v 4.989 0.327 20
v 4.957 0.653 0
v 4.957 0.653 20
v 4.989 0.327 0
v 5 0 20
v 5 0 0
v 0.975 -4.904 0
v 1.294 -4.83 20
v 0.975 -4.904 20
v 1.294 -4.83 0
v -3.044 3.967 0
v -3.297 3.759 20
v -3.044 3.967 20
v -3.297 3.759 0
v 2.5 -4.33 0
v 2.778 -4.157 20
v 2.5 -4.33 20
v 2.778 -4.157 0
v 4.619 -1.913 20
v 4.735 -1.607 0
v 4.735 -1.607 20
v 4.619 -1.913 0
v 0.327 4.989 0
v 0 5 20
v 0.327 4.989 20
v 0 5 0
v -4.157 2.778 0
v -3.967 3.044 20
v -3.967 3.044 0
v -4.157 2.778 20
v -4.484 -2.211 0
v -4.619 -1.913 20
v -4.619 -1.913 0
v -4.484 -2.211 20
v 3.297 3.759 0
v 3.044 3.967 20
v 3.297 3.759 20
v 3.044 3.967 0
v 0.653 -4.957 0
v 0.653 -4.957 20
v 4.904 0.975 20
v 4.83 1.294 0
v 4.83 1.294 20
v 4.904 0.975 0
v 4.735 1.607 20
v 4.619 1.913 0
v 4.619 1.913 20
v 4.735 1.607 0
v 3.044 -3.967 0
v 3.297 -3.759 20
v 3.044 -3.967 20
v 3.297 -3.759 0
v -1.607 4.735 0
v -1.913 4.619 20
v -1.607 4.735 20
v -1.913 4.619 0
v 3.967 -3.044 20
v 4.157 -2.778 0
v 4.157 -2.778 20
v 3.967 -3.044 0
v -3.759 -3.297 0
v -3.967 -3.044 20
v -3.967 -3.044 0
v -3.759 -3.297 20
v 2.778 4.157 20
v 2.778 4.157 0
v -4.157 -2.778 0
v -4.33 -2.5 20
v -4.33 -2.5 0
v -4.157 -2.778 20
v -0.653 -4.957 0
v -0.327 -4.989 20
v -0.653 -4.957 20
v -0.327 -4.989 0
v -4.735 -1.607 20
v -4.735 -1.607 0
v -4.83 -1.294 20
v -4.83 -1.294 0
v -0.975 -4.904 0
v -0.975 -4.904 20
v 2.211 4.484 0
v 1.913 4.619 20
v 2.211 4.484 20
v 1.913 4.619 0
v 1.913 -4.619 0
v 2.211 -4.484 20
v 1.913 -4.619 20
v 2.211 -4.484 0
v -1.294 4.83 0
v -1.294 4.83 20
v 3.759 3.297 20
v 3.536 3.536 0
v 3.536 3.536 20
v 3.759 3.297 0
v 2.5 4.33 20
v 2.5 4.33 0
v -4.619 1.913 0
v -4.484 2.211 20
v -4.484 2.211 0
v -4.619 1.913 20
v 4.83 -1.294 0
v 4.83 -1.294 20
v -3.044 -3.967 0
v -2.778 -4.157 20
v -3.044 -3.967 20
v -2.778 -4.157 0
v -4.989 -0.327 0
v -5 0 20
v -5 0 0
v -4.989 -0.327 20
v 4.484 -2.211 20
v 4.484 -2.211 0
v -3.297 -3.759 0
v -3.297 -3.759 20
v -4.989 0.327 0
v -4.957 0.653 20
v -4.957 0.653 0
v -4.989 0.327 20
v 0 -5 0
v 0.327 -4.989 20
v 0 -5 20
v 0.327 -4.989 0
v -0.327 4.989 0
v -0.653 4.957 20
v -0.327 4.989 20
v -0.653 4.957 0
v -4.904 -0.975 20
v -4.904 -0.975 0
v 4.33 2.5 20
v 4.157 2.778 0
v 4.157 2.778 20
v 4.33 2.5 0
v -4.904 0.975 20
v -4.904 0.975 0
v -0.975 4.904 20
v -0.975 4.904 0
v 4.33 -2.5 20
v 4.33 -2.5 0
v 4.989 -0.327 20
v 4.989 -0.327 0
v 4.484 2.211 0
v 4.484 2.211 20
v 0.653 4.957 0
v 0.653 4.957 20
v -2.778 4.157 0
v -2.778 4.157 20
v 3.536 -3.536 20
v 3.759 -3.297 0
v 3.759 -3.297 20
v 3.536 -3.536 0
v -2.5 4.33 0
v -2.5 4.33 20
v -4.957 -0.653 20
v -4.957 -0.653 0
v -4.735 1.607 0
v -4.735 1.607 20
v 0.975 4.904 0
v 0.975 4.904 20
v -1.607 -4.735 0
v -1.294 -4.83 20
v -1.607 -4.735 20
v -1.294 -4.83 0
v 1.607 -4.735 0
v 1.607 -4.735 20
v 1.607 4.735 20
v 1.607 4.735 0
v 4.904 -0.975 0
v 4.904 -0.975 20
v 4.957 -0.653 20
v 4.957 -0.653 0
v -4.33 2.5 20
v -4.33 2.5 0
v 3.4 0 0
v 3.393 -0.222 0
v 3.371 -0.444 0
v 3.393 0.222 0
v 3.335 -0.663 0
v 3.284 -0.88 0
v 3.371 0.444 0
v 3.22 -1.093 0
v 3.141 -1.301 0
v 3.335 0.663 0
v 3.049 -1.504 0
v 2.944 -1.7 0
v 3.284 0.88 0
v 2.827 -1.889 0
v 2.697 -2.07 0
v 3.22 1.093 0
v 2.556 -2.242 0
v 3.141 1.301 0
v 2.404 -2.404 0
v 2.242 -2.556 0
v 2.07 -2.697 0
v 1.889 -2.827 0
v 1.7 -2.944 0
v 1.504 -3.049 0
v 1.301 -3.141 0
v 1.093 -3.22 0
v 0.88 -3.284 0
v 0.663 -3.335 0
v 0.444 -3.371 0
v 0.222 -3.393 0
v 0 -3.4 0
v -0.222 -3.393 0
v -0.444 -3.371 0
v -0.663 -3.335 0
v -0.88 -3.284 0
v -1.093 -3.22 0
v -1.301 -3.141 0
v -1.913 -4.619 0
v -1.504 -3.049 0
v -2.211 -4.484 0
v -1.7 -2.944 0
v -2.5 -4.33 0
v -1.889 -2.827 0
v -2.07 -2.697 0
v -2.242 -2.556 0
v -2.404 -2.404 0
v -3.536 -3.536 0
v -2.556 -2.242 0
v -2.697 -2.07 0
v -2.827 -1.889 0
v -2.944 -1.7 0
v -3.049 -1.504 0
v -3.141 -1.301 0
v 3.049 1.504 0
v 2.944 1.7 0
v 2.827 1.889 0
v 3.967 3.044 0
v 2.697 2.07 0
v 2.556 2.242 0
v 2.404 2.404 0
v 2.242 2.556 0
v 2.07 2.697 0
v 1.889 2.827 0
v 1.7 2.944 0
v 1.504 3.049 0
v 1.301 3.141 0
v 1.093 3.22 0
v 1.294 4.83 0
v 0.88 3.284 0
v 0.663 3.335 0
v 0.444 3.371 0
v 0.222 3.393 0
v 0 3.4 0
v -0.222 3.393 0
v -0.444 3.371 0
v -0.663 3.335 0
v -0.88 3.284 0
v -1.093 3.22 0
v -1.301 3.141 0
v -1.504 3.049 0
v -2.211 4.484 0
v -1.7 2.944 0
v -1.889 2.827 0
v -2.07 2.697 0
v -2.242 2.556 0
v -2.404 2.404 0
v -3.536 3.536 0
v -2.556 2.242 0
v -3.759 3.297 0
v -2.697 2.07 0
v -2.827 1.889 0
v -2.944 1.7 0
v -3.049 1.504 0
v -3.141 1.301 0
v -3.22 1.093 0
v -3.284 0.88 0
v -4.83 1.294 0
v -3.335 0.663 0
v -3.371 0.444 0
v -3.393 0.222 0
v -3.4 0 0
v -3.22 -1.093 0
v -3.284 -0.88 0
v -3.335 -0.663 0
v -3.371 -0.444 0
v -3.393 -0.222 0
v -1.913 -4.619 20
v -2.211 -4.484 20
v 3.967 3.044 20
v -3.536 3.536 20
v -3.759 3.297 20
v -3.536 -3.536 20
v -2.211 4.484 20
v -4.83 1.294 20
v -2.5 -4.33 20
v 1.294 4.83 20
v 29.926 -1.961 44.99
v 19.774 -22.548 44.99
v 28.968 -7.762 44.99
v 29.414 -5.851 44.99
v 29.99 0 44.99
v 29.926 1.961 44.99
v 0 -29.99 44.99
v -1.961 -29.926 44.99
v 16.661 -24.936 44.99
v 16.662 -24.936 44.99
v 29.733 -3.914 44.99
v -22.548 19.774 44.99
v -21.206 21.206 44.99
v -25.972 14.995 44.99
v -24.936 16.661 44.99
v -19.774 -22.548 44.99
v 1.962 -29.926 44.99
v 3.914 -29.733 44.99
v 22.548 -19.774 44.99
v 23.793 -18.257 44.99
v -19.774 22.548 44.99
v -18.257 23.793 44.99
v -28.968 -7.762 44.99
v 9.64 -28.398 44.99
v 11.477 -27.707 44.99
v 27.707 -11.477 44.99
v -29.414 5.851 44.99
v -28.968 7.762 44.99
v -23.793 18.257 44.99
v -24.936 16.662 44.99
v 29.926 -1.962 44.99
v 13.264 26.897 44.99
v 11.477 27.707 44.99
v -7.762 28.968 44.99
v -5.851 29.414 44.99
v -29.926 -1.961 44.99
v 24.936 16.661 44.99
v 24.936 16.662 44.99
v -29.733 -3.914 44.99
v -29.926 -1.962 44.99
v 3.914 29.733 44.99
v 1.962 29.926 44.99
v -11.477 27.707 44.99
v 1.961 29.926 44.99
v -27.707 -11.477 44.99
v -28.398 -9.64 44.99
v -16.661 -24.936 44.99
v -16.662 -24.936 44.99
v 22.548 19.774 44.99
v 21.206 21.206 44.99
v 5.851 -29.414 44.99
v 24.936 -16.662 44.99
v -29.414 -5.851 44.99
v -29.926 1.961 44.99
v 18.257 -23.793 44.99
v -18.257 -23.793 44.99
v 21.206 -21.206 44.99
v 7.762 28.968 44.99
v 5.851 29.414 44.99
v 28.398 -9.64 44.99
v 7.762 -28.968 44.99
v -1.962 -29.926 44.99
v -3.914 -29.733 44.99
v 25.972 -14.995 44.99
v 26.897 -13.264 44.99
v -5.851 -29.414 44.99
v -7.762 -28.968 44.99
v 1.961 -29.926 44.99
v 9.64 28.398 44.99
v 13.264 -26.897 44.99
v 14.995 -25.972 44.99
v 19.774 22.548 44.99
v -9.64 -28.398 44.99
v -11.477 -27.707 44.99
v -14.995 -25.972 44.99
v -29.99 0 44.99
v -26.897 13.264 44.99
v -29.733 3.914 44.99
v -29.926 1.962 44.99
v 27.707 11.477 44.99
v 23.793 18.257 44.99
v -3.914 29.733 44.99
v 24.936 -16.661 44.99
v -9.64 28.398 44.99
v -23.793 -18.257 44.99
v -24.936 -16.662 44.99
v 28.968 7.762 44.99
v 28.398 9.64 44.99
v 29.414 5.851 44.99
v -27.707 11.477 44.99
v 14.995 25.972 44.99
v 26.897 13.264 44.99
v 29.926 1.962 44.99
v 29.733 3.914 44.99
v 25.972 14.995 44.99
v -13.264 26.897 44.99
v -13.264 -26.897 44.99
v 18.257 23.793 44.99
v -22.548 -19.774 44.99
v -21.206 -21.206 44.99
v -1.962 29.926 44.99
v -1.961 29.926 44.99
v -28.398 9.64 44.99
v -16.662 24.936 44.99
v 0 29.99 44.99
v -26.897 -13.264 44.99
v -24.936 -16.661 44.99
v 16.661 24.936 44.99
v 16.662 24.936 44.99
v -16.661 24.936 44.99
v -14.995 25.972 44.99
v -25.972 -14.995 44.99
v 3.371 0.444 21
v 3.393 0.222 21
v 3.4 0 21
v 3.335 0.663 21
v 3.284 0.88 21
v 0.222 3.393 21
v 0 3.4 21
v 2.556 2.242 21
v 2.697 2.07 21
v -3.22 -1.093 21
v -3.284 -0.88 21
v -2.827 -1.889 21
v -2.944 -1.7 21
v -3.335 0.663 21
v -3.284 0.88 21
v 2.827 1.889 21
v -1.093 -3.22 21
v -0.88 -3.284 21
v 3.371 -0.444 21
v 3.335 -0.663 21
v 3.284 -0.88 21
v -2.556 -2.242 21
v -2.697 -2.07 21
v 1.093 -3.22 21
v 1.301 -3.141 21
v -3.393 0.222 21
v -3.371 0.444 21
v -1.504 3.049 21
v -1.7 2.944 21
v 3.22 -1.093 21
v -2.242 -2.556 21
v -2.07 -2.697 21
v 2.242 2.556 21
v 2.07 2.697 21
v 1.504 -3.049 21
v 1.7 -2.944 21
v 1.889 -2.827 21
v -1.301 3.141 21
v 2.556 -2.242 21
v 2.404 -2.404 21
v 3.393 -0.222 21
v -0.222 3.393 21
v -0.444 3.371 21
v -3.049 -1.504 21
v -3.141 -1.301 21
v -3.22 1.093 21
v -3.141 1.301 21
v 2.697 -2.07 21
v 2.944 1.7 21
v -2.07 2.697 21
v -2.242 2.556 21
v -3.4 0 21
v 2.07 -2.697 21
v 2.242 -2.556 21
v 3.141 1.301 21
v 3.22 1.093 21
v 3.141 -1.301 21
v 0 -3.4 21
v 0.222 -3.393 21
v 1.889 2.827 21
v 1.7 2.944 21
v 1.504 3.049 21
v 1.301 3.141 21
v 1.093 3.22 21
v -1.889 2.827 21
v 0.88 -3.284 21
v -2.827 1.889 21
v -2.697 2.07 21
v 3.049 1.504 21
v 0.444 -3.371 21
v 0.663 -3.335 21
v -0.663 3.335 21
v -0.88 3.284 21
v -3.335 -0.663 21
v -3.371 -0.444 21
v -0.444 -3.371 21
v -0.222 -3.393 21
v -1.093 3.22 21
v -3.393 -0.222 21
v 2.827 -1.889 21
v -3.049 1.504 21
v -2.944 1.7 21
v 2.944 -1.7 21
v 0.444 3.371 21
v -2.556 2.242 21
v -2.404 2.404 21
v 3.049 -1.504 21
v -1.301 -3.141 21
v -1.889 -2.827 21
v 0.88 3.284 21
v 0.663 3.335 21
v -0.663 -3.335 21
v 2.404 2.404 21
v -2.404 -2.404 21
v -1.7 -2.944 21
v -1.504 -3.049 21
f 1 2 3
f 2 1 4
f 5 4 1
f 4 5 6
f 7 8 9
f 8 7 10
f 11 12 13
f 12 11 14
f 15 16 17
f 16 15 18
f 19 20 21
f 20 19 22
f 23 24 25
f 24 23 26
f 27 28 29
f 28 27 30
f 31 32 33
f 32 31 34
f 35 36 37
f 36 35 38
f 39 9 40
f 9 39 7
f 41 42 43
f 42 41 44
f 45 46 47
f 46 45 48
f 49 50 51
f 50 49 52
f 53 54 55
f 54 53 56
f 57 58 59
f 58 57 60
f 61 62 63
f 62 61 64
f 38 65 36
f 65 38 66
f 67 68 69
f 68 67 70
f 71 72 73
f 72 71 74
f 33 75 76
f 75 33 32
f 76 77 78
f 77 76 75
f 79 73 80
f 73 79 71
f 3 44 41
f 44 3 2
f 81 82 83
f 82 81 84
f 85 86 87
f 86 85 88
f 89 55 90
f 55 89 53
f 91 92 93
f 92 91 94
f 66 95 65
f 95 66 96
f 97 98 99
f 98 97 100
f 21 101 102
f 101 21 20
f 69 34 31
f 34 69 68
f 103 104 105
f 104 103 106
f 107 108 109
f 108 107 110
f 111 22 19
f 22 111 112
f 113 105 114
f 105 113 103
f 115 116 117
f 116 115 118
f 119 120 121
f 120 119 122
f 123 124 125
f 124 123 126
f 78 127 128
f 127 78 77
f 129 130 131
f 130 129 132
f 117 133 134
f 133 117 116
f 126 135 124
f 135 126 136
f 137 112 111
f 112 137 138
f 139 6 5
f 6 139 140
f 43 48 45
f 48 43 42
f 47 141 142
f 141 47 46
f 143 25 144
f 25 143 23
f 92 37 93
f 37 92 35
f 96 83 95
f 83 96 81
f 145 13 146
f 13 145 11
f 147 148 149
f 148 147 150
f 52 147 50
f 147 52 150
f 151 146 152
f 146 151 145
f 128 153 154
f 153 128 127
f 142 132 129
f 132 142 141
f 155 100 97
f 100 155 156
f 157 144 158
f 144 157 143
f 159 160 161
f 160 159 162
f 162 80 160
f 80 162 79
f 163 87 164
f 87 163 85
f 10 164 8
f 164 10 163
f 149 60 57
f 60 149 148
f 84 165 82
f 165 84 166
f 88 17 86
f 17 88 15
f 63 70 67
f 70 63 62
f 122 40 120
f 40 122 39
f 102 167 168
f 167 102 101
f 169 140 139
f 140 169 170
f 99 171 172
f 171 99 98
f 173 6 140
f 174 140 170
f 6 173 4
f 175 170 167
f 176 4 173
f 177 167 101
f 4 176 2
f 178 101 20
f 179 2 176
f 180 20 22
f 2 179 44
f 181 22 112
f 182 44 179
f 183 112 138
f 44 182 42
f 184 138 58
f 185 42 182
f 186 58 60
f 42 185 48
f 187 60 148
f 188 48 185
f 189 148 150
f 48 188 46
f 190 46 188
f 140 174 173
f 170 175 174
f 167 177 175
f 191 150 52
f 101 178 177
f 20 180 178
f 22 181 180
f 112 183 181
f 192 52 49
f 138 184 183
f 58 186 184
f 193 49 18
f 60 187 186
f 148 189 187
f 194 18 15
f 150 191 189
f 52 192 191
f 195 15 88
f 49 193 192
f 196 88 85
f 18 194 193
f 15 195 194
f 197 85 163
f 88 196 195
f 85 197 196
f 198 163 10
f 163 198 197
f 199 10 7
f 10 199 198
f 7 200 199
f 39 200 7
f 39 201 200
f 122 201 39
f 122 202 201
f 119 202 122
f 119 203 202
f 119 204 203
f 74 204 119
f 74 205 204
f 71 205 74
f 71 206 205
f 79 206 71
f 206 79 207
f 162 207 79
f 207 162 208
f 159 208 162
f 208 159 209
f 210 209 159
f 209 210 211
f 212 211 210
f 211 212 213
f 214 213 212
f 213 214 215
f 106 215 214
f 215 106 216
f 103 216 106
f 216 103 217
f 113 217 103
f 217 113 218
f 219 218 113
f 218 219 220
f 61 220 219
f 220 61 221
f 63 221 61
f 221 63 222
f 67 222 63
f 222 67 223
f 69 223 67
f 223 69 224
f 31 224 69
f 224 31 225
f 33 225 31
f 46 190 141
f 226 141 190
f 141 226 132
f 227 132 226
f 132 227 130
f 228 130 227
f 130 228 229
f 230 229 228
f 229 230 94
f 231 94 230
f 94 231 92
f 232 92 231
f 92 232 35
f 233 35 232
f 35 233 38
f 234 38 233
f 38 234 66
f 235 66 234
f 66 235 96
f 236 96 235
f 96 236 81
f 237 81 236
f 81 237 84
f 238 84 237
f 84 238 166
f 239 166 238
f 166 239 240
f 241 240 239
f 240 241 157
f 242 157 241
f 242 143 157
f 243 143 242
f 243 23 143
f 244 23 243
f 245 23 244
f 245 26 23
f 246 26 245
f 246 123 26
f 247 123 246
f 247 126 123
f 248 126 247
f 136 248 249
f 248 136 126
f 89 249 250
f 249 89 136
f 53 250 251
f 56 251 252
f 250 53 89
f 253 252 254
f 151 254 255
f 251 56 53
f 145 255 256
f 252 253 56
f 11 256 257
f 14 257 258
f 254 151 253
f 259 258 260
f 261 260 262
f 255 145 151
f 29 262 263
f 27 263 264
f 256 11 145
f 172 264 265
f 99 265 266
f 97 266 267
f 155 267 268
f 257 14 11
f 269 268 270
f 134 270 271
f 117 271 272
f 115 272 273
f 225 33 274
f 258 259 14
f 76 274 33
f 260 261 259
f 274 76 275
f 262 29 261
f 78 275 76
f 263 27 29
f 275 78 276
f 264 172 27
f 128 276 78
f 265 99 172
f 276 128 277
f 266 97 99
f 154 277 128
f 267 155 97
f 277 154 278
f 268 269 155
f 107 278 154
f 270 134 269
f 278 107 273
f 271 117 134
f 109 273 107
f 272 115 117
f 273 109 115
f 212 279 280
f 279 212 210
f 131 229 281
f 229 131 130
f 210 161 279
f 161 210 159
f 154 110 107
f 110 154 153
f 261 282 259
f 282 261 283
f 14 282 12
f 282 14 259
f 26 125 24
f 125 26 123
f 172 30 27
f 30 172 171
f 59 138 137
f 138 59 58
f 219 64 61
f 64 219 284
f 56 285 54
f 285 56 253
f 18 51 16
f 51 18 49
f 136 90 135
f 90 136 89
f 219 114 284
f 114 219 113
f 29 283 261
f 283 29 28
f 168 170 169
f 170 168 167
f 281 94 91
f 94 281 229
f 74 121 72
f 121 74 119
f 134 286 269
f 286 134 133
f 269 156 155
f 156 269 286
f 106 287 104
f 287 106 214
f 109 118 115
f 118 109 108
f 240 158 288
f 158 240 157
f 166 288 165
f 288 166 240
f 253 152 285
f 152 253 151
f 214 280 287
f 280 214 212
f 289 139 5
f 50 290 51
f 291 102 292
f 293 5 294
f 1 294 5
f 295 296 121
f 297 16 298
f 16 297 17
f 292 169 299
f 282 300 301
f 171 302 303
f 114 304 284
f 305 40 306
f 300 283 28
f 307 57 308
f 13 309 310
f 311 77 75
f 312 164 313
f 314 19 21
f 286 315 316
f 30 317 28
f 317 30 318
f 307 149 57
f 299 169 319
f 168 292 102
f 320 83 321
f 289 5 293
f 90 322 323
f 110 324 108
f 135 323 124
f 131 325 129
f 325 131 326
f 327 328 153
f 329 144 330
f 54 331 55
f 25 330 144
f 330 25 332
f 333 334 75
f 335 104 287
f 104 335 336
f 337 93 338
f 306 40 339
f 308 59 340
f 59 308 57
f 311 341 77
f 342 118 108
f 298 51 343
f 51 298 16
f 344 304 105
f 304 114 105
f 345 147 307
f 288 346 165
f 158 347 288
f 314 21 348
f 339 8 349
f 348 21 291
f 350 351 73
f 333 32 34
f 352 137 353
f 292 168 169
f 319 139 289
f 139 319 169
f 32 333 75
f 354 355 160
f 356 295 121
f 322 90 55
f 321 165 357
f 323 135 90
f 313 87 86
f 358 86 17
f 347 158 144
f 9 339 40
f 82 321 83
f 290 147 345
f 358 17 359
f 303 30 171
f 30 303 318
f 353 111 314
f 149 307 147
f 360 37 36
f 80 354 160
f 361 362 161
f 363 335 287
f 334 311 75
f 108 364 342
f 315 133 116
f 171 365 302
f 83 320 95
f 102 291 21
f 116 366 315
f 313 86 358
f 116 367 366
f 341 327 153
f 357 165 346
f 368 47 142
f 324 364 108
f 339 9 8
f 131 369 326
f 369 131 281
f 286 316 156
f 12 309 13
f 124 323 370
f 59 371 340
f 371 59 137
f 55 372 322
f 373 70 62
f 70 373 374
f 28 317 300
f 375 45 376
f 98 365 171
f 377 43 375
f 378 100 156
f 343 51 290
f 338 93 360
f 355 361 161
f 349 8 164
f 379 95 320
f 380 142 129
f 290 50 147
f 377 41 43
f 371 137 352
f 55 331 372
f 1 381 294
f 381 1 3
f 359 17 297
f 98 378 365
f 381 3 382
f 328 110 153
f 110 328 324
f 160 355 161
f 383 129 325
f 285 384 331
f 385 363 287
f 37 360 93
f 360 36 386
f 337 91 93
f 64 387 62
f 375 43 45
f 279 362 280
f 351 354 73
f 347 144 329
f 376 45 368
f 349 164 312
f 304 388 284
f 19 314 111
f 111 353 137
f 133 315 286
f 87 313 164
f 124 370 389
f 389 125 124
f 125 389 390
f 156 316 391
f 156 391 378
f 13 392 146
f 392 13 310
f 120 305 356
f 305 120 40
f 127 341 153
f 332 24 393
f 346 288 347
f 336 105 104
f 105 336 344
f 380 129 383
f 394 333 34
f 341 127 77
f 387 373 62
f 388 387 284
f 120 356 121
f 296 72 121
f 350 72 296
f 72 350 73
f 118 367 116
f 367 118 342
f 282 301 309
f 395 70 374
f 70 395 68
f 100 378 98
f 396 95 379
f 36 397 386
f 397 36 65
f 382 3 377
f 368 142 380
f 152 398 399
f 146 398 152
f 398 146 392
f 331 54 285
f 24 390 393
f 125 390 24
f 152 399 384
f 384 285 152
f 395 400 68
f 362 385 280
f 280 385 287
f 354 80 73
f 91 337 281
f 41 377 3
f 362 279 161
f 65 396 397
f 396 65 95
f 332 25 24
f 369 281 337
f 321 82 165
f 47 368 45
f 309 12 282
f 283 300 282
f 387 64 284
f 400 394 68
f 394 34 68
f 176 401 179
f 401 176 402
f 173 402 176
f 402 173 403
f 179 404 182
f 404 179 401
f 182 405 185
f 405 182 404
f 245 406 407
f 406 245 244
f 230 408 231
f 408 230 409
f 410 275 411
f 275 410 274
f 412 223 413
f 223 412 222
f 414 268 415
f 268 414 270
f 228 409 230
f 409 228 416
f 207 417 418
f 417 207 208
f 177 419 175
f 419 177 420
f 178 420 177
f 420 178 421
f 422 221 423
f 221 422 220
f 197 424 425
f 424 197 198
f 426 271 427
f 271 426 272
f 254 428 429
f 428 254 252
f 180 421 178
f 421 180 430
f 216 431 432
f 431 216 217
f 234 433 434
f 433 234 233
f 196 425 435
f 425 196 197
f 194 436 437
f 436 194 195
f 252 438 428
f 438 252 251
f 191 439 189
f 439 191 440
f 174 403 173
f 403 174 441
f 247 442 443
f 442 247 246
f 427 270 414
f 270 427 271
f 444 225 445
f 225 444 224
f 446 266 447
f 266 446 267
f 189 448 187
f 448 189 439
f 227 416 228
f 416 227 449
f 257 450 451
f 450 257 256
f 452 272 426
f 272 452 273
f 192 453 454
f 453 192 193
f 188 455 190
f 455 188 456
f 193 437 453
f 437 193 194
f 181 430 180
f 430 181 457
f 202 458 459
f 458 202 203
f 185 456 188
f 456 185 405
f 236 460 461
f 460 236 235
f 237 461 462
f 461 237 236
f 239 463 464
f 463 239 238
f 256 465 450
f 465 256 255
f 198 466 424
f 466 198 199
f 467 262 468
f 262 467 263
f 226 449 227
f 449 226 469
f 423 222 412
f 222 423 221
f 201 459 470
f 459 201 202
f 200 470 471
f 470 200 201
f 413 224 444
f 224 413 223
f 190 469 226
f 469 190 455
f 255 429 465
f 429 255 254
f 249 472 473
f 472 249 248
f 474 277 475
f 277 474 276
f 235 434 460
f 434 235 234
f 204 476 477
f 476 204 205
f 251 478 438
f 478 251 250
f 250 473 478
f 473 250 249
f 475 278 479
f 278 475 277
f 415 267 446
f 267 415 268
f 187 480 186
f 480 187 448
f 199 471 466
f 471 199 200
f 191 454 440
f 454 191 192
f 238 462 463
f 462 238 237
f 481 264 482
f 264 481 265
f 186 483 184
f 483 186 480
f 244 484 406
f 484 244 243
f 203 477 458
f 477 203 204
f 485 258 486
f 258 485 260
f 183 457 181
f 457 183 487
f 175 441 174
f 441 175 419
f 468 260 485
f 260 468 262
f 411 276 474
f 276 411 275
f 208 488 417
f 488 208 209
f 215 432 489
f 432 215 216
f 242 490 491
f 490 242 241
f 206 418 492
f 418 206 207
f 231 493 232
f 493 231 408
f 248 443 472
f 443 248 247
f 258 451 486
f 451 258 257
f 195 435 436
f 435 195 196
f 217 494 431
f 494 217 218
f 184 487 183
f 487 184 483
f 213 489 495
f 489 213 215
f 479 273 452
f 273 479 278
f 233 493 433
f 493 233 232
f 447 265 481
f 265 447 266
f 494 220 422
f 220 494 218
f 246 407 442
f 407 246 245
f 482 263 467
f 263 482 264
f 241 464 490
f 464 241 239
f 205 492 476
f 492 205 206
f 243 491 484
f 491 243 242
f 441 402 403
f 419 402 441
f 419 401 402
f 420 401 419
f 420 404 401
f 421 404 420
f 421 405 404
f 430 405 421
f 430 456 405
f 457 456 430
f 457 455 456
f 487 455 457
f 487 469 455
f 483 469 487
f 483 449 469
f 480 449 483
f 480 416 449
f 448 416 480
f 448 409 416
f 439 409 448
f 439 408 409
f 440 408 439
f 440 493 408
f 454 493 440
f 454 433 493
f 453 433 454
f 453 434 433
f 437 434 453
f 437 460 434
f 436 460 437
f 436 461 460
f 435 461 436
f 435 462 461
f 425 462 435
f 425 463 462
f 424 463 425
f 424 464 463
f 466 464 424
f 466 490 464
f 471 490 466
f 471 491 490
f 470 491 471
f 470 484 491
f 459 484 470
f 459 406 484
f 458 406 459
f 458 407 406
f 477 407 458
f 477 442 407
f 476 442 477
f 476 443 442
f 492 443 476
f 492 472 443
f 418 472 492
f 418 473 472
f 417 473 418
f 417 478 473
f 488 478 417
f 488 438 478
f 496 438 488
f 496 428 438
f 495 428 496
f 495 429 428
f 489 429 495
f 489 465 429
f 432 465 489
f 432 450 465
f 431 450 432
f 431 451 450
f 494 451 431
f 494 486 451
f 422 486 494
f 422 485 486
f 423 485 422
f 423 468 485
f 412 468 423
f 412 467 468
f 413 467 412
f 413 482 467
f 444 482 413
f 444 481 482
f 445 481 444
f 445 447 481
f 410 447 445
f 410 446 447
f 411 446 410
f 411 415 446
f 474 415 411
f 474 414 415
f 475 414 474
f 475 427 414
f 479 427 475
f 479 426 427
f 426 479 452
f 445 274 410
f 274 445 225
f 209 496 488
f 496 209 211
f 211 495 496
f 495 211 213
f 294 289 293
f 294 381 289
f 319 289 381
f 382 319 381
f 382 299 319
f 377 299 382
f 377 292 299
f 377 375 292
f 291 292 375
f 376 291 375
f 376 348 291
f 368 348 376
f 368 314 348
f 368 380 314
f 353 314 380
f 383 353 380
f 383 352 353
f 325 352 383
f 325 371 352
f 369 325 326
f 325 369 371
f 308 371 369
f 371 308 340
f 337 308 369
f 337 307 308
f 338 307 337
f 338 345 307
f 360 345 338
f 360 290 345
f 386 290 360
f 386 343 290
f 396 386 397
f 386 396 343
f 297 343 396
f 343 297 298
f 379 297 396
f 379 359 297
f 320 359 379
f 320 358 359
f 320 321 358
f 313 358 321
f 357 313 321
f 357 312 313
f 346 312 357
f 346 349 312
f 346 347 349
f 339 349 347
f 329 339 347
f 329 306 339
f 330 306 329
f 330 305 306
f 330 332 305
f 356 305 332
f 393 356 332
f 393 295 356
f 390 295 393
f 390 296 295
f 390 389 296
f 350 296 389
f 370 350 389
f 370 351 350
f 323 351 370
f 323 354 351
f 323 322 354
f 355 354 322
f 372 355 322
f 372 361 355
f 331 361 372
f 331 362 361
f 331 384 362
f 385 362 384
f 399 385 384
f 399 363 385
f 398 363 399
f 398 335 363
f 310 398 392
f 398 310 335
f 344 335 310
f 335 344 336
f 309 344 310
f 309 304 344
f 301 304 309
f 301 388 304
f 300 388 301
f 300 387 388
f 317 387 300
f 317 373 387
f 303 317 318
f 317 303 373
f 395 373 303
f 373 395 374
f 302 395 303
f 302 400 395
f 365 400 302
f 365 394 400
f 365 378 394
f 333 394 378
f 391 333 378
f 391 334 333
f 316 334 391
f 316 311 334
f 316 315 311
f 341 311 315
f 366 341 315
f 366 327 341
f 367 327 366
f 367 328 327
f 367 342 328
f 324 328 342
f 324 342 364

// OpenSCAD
// Small lab funnel - printed upright, open top and bottom
// Units: mm

$fn = 96;

// --- Dimensions ---
spout_od      = 10;    // spout outer diameter
spout_len     = 20;    // spout length (z = 0 to 20)
cone_bottom_d = 10;    // cone outer diameter at z = 20
cone_top_d    = 60;    // cone outer diameter at rim (z = 50)
wall          = 1.6;   // wall thickness everywhere

// --- Derived ---
spout_id = spout_od - 2 * wall;   // bore diameter (6.8 mm)
total_h  = spout_len + (cone_top_d - cone_bottom_d) / 2; // 50 mm

difference() {
    union() {
        // Spout (tube)
        cylinder(d = spout_od, h = spout_len);

        // Cone from z = 20 to z = 50
        translate([0, 0, spout_len])
            cylinder(d1 = cone_bottom_d, d2 = cone_top_d, h = total_h - spout_len);
    }

    // Bottom bore through the spout
    translate([0, 0, -1])
        cylinder(d = spout_id, h = spout_len + 2);

    // Top opening (through the cone rim)
    translate([0, 0, total_h - 0.01])
        cylinder(d = cone_top_d + 0.02, h = 0.02);
}
